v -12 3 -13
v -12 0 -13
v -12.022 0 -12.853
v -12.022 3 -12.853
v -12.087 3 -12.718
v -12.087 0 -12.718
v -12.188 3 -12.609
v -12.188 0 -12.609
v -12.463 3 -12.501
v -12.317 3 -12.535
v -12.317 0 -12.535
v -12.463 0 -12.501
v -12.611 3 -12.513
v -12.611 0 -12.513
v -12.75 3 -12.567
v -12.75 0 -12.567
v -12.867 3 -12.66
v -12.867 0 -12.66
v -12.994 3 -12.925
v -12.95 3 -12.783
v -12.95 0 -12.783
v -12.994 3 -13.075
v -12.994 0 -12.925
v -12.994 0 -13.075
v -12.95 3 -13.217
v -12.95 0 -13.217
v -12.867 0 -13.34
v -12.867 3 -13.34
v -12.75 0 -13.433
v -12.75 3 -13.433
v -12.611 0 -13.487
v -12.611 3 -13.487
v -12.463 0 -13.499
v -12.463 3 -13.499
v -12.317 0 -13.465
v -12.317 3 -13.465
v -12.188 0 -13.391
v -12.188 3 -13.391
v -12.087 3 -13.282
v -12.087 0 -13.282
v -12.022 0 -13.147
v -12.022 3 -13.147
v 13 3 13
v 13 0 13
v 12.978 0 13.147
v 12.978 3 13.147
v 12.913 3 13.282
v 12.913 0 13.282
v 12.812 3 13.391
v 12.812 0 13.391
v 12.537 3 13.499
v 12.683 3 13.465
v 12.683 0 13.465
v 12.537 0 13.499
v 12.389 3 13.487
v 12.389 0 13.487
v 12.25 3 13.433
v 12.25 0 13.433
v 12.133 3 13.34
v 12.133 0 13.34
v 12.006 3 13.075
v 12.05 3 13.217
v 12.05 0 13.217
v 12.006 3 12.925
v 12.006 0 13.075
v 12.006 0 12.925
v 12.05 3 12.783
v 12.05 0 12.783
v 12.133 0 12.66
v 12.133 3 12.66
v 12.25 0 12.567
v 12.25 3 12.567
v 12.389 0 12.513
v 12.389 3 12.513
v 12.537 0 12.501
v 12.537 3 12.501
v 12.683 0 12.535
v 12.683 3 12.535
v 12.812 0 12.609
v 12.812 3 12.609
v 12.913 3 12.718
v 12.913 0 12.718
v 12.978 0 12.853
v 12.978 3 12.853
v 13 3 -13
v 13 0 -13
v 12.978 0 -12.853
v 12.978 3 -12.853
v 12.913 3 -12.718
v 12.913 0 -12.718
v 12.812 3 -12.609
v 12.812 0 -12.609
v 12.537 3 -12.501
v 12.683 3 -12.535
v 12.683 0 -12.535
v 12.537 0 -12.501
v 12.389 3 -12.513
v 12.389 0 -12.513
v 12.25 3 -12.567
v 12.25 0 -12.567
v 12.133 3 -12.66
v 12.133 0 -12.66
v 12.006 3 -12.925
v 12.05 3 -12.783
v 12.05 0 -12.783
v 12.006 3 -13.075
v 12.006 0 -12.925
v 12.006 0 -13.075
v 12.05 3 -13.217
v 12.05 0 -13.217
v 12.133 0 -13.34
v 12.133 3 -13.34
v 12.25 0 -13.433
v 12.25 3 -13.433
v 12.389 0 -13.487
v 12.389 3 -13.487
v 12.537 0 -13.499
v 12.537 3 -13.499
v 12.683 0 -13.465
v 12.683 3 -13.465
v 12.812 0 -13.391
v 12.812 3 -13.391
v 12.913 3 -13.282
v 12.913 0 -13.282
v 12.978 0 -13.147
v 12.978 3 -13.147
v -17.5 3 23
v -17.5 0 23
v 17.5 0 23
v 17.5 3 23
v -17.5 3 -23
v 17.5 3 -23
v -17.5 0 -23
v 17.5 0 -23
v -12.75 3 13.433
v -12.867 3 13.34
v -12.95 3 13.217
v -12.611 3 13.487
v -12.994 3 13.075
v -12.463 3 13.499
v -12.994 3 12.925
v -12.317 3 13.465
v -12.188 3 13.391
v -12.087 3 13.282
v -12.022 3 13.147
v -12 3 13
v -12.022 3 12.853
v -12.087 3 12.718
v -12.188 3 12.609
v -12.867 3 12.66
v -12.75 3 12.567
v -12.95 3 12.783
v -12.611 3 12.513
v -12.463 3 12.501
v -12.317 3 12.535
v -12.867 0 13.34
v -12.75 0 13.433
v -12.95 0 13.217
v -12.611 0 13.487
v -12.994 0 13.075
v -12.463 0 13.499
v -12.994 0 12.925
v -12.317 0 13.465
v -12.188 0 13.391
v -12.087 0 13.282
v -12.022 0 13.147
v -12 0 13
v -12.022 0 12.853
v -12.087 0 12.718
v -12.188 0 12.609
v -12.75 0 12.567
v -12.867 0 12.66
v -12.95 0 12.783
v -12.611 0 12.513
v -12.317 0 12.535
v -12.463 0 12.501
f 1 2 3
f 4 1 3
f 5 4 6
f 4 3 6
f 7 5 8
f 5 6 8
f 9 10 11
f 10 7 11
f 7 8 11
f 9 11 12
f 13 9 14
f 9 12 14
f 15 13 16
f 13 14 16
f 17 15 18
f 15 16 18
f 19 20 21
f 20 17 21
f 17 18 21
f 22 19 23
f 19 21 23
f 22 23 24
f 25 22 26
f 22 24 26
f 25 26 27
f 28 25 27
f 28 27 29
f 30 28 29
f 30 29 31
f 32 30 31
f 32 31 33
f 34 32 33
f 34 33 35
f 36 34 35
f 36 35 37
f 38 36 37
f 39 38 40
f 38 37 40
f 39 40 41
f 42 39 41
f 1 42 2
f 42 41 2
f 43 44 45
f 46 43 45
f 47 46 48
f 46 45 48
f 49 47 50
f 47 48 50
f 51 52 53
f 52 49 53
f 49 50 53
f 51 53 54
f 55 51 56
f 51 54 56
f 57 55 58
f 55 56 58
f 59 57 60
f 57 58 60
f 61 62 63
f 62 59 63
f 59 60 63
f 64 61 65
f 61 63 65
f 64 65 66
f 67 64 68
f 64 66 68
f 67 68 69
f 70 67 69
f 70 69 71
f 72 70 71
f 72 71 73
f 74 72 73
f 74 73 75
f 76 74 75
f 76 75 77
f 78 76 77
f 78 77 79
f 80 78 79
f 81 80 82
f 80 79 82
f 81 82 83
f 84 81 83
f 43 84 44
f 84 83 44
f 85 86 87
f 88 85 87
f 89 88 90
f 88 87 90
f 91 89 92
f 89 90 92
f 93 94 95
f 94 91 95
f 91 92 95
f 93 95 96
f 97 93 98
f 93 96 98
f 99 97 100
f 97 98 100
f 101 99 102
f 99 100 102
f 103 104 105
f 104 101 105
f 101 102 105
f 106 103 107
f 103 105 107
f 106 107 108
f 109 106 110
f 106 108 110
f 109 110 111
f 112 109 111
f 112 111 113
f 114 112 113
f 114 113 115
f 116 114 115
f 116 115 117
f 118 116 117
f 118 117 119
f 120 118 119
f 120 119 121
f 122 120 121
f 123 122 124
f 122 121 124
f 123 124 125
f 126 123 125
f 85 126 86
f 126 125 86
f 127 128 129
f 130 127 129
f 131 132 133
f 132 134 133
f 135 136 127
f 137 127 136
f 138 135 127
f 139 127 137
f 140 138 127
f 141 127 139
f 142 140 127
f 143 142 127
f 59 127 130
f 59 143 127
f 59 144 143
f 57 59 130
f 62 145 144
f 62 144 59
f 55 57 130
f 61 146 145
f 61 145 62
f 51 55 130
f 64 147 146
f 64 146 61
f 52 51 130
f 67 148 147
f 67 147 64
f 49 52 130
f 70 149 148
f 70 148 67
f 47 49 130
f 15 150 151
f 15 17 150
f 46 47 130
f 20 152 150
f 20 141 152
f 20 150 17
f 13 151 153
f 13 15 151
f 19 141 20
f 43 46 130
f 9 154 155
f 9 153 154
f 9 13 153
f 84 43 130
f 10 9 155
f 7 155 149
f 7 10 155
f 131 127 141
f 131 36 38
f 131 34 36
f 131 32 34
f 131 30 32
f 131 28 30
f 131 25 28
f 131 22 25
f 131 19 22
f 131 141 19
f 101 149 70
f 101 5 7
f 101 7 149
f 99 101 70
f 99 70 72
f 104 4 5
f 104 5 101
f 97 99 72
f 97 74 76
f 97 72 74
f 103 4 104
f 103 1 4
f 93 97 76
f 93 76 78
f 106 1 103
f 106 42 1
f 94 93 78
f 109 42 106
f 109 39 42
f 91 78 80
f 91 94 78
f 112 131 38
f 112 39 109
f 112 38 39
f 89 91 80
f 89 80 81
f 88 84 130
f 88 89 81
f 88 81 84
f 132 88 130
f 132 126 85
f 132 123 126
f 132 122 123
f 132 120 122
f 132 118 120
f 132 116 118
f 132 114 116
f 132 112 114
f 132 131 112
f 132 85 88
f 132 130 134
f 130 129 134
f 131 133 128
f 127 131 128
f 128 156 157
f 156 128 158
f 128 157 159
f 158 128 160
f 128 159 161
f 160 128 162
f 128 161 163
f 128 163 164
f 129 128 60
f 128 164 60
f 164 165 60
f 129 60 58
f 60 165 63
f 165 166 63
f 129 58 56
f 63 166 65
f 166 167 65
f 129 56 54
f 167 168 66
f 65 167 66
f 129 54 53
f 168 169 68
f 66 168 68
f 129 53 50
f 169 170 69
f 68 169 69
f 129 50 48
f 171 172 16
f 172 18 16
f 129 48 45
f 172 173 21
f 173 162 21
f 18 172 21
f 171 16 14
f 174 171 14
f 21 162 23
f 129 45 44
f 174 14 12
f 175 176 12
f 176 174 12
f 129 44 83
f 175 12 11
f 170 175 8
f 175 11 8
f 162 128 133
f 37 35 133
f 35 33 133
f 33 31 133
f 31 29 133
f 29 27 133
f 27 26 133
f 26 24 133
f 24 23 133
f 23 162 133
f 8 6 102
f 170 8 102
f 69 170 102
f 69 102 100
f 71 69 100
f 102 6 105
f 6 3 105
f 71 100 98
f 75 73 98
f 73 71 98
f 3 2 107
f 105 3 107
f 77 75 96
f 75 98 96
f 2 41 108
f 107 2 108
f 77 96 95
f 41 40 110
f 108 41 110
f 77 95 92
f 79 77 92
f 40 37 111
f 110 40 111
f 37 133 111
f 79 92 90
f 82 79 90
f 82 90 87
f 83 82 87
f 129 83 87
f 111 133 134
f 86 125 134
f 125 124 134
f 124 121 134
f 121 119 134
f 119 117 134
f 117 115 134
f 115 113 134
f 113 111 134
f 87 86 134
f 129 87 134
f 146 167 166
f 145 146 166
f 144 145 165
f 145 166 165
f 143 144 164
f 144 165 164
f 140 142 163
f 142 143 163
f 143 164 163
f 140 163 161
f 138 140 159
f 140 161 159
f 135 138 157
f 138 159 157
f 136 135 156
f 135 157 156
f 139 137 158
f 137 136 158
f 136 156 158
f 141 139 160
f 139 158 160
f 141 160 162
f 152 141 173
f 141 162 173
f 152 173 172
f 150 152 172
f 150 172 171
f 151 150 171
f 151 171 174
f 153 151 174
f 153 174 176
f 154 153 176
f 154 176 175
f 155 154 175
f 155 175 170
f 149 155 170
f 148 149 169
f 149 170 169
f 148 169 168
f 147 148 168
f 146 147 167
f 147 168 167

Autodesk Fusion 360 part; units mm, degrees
sketch "Sketch1" plane through (0, 0, 0) normal (0, 1, 0) x (1, 0, 0)
  line L0 (17.5, 23) -> (-17.5, 23)
  line L1 (-17.5, 23) -> (-17.5, -23)
  line L2 (-17.5, -23) -> (17.5, -23)
  line L3 (17.5, -23) -> (17.5, 23)
  line L4 (17.5, 23) -> (-17.5, -23) construction
  line L5 (-17.5, 23) -> (17.5, -23) construction
  circle A0 centre (-12.5, -13) radius 0.5
  circle A1 centre (12.5, -13) radius 0.5
  circle A2 centre (12.5, 13) radius 0.5
  circle A3 centre (-12.5, 13) radius 0.5
  dimension "d1" = 46
  dimension "d2" = 35
  dimension "d3" = 1
  dimension "d4" = 1
  dimension "d5" = 1
  dimension "d6" = 1
  dimension "d7" = 10
  dimension "d8" = 5
  dimension "d9" = 5
  dimension "d10" = 10
  dimension "d11" = 10
  dimension "d12" = 5
  dimension "d13" = 10
  dimension "d14" = 5
  dimension "d15" = 15
  dimension "d16" = 15
extrude "Extrude1" add sketch "Sketch1" along normal blind 3
